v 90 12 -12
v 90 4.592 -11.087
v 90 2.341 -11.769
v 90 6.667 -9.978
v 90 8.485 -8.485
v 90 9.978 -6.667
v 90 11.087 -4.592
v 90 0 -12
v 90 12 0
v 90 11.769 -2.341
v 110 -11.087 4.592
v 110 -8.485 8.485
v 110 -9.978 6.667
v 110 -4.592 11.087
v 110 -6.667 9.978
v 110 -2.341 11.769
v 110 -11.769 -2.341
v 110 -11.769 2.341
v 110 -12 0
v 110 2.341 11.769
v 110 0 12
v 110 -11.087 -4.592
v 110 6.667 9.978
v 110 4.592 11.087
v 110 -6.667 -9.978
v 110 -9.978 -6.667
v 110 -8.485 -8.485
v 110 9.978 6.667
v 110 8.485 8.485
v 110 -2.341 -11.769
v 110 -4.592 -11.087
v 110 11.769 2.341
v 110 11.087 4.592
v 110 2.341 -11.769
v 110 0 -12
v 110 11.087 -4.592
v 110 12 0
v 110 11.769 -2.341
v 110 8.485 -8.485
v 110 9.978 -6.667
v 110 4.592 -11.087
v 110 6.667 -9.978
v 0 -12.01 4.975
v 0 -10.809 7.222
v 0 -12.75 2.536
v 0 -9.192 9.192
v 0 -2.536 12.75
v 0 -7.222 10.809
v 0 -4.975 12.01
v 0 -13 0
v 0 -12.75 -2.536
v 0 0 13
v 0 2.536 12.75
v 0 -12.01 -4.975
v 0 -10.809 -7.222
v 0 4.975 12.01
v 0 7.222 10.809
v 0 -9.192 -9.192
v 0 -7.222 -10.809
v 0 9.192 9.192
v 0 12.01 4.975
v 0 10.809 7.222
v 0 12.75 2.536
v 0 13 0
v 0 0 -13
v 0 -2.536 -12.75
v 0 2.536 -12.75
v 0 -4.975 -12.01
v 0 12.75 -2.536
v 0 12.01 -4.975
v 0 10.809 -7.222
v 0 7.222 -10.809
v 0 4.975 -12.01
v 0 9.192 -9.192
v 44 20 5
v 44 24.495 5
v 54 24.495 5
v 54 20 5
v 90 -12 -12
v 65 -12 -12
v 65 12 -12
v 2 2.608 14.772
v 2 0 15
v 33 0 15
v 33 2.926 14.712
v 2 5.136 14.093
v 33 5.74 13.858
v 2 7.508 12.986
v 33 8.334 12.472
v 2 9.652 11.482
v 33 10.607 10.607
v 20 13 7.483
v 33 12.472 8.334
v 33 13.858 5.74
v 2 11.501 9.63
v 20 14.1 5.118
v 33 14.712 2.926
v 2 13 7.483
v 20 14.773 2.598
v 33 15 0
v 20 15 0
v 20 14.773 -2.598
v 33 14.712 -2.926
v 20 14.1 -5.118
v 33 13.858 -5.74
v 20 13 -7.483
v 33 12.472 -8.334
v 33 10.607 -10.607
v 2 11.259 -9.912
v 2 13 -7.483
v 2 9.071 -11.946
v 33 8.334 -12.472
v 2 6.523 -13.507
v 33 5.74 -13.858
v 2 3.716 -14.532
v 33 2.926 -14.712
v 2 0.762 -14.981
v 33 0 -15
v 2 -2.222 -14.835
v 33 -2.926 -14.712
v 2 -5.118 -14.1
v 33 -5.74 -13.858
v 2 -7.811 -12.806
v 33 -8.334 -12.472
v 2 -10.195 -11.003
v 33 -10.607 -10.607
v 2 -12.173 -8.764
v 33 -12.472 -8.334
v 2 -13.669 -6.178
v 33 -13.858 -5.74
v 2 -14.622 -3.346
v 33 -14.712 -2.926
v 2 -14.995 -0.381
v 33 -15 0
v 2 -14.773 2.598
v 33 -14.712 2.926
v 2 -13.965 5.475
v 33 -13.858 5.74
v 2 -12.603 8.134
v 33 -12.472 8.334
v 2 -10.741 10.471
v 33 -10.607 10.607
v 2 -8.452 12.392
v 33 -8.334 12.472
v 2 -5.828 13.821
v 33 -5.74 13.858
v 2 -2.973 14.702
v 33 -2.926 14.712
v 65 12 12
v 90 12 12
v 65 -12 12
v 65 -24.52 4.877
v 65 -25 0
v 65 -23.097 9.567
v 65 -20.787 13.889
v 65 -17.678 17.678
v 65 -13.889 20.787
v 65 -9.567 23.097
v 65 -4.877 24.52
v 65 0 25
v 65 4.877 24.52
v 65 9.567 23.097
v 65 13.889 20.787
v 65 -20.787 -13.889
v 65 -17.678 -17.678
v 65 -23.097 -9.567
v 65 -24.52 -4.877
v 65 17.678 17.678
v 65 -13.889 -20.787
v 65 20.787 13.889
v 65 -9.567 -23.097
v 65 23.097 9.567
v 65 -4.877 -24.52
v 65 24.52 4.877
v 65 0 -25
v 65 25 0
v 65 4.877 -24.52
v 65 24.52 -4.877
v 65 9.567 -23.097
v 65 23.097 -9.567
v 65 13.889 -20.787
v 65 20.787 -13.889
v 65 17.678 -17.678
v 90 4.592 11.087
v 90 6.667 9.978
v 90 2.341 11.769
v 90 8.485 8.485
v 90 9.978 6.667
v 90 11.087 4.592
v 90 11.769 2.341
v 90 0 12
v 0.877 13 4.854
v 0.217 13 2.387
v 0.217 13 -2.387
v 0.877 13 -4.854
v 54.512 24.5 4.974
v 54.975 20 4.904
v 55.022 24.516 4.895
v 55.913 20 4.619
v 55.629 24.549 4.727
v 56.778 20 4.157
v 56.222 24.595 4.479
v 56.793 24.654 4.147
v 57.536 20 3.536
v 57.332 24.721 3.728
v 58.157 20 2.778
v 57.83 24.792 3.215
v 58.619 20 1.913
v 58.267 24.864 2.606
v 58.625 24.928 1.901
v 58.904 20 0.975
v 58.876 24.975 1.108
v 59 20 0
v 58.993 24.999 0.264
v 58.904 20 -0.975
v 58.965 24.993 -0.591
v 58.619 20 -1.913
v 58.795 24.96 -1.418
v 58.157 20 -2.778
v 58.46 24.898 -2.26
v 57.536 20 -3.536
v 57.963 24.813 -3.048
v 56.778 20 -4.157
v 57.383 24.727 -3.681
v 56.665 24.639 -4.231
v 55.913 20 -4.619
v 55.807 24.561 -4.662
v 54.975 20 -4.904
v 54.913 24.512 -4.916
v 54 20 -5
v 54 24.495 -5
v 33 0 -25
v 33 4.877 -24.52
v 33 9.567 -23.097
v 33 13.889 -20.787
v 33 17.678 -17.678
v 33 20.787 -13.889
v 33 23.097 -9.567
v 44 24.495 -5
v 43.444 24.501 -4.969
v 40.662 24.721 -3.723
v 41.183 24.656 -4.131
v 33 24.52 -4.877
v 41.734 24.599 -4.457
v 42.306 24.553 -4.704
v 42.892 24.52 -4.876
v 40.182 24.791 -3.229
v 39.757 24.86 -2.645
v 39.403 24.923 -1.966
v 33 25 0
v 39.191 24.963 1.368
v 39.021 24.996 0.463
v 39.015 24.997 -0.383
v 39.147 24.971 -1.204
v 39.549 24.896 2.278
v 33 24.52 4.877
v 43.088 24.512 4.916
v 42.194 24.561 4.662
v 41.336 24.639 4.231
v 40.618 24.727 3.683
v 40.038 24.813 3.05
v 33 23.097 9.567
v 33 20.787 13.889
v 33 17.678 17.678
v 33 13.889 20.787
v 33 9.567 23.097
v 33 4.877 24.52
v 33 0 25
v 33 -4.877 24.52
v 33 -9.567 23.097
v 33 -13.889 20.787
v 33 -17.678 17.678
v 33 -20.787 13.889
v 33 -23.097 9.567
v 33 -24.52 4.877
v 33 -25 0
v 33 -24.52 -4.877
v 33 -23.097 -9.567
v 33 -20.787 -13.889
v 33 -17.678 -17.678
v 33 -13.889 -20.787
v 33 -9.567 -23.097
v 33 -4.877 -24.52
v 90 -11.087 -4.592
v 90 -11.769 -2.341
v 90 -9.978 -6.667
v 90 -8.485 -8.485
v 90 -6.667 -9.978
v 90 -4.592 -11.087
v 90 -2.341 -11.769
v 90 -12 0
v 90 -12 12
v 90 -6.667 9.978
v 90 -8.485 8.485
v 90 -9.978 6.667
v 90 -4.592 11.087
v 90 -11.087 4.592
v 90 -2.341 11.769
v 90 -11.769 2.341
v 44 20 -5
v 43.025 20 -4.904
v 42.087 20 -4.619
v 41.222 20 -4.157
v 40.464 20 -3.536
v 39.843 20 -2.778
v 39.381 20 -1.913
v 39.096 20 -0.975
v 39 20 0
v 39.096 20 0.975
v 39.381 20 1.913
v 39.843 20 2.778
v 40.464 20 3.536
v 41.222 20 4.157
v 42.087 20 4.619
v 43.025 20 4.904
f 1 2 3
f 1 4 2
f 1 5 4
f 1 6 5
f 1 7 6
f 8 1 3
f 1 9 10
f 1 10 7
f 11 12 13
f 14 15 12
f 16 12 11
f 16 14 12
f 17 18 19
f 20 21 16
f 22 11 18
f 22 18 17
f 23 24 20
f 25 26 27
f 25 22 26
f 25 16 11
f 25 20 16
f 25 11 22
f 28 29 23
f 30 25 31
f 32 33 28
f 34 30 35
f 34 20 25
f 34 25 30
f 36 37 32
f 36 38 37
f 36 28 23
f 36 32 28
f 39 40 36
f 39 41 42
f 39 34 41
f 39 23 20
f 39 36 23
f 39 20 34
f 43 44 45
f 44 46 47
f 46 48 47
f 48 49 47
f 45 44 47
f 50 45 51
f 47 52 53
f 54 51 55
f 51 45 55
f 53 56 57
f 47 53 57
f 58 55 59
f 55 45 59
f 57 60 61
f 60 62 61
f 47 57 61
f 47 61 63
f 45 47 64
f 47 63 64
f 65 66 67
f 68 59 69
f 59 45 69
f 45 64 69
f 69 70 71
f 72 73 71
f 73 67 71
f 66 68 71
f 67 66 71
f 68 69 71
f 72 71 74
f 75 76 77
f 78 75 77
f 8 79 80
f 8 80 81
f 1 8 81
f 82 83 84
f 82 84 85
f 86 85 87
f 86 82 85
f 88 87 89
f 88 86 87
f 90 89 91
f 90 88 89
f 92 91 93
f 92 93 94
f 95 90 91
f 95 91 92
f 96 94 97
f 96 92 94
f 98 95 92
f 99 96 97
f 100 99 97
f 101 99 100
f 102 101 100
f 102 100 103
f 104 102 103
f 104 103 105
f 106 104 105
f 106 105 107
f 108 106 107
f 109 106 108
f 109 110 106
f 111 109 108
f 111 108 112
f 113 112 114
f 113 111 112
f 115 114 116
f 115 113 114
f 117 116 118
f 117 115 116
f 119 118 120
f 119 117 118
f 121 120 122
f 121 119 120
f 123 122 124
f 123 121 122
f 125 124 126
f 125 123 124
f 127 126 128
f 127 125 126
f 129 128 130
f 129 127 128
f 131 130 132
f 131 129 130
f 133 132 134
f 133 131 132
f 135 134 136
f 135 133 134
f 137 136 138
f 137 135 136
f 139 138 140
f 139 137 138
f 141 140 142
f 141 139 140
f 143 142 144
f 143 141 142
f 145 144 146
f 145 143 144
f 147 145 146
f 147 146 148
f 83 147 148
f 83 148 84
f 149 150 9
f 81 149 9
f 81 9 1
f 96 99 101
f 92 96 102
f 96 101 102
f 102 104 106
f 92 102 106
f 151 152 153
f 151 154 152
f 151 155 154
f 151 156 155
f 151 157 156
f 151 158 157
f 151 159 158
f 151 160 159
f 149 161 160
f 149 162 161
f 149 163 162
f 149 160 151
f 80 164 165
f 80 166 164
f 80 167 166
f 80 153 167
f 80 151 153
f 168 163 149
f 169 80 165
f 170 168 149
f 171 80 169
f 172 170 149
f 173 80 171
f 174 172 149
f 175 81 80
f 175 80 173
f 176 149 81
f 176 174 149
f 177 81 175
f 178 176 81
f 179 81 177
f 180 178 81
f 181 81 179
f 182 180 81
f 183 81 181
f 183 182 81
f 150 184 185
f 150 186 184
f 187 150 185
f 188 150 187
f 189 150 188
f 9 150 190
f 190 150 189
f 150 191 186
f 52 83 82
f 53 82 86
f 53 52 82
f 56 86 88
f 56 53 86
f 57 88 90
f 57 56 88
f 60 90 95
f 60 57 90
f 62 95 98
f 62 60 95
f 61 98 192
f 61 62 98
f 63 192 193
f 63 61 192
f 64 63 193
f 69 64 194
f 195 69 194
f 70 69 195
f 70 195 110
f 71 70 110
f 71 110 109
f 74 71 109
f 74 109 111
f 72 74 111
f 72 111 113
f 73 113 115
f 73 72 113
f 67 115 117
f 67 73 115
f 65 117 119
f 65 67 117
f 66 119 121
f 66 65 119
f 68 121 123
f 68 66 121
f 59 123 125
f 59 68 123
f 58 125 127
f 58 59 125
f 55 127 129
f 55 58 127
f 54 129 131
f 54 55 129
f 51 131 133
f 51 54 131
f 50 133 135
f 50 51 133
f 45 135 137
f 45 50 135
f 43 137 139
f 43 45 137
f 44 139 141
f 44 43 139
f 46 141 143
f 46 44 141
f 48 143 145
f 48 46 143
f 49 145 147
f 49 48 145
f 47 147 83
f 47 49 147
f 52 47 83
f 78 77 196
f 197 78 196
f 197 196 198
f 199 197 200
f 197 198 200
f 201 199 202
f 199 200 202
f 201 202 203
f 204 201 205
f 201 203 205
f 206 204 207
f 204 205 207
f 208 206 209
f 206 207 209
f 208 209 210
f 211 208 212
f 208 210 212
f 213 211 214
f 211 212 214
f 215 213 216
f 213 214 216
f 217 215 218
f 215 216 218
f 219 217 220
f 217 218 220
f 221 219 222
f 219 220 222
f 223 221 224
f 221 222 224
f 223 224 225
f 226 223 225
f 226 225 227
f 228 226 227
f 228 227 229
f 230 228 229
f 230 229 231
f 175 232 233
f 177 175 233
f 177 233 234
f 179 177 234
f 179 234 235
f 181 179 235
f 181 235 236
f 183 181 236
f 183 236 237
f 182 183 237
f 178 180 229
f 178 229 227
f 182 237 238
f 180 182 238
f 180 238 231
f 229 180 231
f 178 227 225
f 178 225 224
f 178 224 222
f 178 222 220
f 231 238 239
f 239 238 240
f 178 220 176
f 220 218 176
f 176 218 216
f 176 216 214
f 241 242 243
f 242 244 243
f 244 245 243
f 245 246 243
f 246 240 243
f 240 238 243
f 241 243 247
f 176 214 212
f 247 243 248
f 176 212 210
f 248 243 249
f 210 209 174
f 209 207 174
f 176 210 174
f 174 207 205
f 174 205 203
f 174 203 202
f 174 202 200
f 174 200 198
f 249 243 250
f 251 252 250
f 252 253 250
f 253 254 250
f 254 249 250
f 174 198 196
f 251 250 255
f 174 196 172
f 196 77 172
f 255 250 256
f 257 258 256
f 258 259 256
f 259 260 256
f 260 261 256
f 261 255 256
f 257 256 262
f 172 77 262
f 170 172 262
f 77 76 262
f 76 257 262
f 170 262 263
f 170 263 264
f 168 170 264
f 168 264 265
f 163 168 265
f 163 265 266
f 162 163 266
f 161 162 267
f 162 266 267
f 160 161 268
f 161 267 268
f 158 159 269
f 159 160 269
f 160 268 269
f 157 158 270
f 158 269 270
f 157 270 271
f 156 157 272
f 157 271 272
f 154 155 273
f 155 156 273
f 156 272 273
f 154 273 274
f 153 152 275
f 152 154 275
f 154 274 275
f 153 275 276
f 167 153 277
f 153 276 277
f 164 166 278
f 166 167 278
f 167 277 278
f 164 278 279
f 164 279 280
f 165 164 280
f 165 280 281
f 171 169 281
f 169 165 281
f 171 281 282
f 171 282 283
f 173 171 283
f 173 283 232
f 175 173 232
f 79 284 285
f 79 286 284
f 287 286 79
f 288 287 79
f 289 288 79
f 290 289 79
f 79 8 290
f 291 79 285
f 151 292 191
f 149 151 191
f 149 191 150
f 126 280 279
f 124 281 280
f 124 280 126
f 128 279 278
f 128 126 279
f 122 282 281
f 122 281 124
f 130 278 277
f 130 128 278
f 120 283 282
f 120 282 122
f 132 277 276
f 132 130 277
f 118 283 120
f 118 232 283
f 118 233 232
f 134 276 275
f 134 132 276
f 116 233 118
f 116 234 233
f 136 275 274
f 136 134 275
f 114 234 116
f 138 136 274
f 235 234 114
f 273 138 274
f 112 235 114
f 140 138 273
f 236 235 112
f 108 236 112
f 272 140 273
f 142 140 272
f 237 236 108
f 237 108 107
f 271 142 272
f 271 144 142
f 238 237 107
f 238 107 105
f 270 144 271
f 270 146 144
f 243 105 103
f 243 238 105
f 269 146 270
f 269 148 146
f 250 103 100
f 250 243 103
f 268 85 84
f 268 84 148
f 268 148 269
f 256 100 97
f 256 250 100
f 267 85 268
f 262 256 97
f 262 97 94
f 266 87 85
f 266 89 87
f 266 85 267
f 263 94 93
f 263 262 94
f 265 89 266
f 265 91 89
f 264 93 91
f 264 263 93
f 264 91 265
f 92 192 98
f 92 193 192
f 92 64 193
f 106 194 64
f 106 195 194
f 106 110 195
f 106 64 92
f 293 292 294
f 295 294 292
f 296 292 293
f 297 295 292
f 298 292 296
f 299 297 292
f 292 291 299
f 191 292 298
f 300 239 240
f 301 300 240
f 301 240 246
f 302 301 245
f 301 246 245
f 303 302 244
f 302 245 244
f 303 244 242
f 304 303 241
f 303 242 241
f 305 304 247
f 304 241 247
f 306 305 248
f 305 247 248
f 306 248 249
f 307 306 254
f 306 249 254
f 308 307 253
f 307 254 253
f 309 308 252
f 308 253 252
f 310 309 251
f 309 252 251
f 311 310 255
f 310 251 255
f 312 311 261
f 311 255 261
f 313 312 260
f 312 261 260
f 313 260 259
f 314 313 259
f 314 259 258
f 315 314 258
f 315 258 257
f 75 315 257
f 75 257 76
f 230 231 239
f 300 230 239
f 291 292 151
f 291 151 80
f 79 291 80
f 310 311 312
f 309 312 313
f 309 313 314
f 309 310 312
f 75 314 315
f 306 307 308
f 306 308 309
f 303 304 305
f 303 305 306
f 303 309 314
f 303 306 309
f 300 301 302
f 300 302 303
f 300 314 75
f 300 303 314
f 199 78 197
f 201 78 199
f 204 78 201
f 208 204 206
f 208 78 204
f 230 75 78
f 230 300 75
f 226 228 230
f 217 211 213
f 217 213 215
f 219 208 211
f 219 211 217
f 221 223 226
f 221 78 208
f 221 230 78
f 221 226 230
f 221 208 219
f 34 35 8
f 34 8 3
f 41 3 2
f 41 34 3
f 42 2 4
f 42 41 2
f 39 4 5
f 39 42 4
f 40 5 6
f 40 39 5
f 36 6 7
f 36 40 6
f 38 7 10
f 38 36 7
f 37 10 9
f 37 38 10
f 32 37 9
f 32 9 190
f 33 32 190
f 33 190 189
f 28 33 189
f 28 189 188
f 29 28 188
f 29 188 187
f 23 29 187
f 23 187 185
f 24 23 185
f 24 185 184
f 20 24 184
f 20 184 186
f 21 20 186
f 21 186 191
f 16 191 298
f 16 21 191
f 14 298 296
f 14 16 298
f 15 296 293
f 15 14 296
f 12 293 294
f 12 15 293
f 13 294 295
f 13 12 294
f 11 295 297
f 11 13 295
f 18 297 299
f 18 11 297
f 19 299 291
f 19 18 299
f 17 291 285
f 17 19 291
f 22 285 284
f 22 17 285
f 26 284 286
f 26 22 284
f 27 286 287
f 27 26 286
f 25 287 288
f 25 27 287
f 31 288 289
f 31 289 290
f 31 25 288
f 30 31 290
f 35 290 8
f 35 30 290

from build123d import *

# Parameters (mm, degrees)
SKETCH1_R           = 25
BOSS_EXTRUDE1_DEPTH = 110
SKETCH2_OUTSIDE_W   = 78.154
SKETCH2_OUTSIDE_H   = 78.154
SKETCH2_OUTSIDE_W_2 = 24
SKETCH2_OUTSIDE_H_2 = 24
CUT_EXTRUDE1_DEPTH  = 45
SKETCH3_OUTSIDE_W   = 78.154
SKETCH3_OUTSIDE_H   = 78.154
SKETCH3_OUTSIDE_R   = 12
CUT_EXTRUDE2_DEPTH  = 20
SKETCH4_OUTSIDE_W   = 78.154
SKETCH4_OUTSIDE_H   = 78.154
SKETCH4_OUTSIDE_R   = 15
CUT_EXTRUDE3_DEPTH  = 33
CHAMFER1_SIZE       = 2
SKETCH5_W           = 20
SKETCH5_H           = 16
CUT_EXTRUDE4_DEPTH  = 2
CUT_EXTRUDE5_DEPTH  = 5


with BuildPart() as part:
    # Sketch1 → Boss-Extrude1 (new body)
    with BuildSketch(Plane(origin=(0, 0, 0), x_dir=(0, 0, -1), z_dir=(1, 0, 0))):
        Circle(SKETCH1_R)
    extrude(amount=BOSS_EXTRUDE1_DEPTH)

    # Sketch2 outside → Cut-Extrude1 (cut)
    with BuildSketch(Plane(origin=(110, 0, 0), x_dir=(0, 0, -1), z_dir=(1, 0, 0))):
        Rectangle(SKETCH2_OUTSIDE_W, SKETCH2_OUTSIDE_H)
        Rectangle(SKETCH2_OUTSIDE_W_2, SKETCH2_OUTSIDE_H_2, mode=Mode.SUBTRACT)
    extrude(amount=-CUT_EXTRUDE1_DEPTH, mode=Mode.SUBTRACT)

    # Sketch3 outside → Cut-Extrude2 (cut)
    with BuildSketch(Plane(origin=(110, 0, 0), x_dir=(0, 0, -1), z_dir=(1, 0, 0))):
        Rectangle(SKETCH3_OUTSIDE_W, SKETCH3_OUTSIDE_H)
        Circle(SKETCH3_OUTSIDE_R, mode=Mode.SUBTRACT)
    extrude(amount=-CUT_EXTRUDE2_DEPTH, mode=Mode.SUBTRACT)

    # Sketch4 outside → Cut-Extrude3 (cut)
    with BuildSketch(Plane.ZY):
        Rectangle(SKETCH4_OUTSIDE_W, SKETCH4_OUTSIDE_H)
        Circle(SKETCH4_OUTSIDE_R, mode=Mode.SUBTRACT)
    extrude(amount=-CUT_EXTRUDE3_DEPTH, mode=Mode.SUBTRACT)

    # Chamfer1
    chamfer1_edges = [part.edges().sort_by_distance(p)[0] for p in [
        (0, 0, -15),
    ]]
    chamfer(chamfer1_edges, length=CHAMFER1_SIZE)

    # Sketch5 → Cut-Extrude4 (cut)
    with BuildSketch(Plane(origin=(0, 15, 0), x_dir=(1, 0, 0), z_dir=(0, 1, 0))):
        with Locations((10, 0)):
            Rectangle(SKETCH5_W, SKETCH5_H)
    extrude(amount=-CUT_EXTRUDE4_DEPTH, mode=Mode.SUBTRACT)

    # Sketch6 → Cut-Extrude5 (cut)
    with BuildSketch(Plane(origin=(0, 25, 0), x_dir=(1, 0, 0), z_dir=(0, 1, 0))):
        with BuildLine():
            Line((44, -5), (54, -5))
            ThreePointArc((54, -5), (59, 0), (54, 5))
            Line((54, 5), (44, 5))
            ThreePointArc((44, 5), (39, 0), (44, -5))
        make_face()
    extrude(amount=-CUT_EXTRUDE5_DEPTH, mode=Mode.SUBTRACT)


solid = part.part
